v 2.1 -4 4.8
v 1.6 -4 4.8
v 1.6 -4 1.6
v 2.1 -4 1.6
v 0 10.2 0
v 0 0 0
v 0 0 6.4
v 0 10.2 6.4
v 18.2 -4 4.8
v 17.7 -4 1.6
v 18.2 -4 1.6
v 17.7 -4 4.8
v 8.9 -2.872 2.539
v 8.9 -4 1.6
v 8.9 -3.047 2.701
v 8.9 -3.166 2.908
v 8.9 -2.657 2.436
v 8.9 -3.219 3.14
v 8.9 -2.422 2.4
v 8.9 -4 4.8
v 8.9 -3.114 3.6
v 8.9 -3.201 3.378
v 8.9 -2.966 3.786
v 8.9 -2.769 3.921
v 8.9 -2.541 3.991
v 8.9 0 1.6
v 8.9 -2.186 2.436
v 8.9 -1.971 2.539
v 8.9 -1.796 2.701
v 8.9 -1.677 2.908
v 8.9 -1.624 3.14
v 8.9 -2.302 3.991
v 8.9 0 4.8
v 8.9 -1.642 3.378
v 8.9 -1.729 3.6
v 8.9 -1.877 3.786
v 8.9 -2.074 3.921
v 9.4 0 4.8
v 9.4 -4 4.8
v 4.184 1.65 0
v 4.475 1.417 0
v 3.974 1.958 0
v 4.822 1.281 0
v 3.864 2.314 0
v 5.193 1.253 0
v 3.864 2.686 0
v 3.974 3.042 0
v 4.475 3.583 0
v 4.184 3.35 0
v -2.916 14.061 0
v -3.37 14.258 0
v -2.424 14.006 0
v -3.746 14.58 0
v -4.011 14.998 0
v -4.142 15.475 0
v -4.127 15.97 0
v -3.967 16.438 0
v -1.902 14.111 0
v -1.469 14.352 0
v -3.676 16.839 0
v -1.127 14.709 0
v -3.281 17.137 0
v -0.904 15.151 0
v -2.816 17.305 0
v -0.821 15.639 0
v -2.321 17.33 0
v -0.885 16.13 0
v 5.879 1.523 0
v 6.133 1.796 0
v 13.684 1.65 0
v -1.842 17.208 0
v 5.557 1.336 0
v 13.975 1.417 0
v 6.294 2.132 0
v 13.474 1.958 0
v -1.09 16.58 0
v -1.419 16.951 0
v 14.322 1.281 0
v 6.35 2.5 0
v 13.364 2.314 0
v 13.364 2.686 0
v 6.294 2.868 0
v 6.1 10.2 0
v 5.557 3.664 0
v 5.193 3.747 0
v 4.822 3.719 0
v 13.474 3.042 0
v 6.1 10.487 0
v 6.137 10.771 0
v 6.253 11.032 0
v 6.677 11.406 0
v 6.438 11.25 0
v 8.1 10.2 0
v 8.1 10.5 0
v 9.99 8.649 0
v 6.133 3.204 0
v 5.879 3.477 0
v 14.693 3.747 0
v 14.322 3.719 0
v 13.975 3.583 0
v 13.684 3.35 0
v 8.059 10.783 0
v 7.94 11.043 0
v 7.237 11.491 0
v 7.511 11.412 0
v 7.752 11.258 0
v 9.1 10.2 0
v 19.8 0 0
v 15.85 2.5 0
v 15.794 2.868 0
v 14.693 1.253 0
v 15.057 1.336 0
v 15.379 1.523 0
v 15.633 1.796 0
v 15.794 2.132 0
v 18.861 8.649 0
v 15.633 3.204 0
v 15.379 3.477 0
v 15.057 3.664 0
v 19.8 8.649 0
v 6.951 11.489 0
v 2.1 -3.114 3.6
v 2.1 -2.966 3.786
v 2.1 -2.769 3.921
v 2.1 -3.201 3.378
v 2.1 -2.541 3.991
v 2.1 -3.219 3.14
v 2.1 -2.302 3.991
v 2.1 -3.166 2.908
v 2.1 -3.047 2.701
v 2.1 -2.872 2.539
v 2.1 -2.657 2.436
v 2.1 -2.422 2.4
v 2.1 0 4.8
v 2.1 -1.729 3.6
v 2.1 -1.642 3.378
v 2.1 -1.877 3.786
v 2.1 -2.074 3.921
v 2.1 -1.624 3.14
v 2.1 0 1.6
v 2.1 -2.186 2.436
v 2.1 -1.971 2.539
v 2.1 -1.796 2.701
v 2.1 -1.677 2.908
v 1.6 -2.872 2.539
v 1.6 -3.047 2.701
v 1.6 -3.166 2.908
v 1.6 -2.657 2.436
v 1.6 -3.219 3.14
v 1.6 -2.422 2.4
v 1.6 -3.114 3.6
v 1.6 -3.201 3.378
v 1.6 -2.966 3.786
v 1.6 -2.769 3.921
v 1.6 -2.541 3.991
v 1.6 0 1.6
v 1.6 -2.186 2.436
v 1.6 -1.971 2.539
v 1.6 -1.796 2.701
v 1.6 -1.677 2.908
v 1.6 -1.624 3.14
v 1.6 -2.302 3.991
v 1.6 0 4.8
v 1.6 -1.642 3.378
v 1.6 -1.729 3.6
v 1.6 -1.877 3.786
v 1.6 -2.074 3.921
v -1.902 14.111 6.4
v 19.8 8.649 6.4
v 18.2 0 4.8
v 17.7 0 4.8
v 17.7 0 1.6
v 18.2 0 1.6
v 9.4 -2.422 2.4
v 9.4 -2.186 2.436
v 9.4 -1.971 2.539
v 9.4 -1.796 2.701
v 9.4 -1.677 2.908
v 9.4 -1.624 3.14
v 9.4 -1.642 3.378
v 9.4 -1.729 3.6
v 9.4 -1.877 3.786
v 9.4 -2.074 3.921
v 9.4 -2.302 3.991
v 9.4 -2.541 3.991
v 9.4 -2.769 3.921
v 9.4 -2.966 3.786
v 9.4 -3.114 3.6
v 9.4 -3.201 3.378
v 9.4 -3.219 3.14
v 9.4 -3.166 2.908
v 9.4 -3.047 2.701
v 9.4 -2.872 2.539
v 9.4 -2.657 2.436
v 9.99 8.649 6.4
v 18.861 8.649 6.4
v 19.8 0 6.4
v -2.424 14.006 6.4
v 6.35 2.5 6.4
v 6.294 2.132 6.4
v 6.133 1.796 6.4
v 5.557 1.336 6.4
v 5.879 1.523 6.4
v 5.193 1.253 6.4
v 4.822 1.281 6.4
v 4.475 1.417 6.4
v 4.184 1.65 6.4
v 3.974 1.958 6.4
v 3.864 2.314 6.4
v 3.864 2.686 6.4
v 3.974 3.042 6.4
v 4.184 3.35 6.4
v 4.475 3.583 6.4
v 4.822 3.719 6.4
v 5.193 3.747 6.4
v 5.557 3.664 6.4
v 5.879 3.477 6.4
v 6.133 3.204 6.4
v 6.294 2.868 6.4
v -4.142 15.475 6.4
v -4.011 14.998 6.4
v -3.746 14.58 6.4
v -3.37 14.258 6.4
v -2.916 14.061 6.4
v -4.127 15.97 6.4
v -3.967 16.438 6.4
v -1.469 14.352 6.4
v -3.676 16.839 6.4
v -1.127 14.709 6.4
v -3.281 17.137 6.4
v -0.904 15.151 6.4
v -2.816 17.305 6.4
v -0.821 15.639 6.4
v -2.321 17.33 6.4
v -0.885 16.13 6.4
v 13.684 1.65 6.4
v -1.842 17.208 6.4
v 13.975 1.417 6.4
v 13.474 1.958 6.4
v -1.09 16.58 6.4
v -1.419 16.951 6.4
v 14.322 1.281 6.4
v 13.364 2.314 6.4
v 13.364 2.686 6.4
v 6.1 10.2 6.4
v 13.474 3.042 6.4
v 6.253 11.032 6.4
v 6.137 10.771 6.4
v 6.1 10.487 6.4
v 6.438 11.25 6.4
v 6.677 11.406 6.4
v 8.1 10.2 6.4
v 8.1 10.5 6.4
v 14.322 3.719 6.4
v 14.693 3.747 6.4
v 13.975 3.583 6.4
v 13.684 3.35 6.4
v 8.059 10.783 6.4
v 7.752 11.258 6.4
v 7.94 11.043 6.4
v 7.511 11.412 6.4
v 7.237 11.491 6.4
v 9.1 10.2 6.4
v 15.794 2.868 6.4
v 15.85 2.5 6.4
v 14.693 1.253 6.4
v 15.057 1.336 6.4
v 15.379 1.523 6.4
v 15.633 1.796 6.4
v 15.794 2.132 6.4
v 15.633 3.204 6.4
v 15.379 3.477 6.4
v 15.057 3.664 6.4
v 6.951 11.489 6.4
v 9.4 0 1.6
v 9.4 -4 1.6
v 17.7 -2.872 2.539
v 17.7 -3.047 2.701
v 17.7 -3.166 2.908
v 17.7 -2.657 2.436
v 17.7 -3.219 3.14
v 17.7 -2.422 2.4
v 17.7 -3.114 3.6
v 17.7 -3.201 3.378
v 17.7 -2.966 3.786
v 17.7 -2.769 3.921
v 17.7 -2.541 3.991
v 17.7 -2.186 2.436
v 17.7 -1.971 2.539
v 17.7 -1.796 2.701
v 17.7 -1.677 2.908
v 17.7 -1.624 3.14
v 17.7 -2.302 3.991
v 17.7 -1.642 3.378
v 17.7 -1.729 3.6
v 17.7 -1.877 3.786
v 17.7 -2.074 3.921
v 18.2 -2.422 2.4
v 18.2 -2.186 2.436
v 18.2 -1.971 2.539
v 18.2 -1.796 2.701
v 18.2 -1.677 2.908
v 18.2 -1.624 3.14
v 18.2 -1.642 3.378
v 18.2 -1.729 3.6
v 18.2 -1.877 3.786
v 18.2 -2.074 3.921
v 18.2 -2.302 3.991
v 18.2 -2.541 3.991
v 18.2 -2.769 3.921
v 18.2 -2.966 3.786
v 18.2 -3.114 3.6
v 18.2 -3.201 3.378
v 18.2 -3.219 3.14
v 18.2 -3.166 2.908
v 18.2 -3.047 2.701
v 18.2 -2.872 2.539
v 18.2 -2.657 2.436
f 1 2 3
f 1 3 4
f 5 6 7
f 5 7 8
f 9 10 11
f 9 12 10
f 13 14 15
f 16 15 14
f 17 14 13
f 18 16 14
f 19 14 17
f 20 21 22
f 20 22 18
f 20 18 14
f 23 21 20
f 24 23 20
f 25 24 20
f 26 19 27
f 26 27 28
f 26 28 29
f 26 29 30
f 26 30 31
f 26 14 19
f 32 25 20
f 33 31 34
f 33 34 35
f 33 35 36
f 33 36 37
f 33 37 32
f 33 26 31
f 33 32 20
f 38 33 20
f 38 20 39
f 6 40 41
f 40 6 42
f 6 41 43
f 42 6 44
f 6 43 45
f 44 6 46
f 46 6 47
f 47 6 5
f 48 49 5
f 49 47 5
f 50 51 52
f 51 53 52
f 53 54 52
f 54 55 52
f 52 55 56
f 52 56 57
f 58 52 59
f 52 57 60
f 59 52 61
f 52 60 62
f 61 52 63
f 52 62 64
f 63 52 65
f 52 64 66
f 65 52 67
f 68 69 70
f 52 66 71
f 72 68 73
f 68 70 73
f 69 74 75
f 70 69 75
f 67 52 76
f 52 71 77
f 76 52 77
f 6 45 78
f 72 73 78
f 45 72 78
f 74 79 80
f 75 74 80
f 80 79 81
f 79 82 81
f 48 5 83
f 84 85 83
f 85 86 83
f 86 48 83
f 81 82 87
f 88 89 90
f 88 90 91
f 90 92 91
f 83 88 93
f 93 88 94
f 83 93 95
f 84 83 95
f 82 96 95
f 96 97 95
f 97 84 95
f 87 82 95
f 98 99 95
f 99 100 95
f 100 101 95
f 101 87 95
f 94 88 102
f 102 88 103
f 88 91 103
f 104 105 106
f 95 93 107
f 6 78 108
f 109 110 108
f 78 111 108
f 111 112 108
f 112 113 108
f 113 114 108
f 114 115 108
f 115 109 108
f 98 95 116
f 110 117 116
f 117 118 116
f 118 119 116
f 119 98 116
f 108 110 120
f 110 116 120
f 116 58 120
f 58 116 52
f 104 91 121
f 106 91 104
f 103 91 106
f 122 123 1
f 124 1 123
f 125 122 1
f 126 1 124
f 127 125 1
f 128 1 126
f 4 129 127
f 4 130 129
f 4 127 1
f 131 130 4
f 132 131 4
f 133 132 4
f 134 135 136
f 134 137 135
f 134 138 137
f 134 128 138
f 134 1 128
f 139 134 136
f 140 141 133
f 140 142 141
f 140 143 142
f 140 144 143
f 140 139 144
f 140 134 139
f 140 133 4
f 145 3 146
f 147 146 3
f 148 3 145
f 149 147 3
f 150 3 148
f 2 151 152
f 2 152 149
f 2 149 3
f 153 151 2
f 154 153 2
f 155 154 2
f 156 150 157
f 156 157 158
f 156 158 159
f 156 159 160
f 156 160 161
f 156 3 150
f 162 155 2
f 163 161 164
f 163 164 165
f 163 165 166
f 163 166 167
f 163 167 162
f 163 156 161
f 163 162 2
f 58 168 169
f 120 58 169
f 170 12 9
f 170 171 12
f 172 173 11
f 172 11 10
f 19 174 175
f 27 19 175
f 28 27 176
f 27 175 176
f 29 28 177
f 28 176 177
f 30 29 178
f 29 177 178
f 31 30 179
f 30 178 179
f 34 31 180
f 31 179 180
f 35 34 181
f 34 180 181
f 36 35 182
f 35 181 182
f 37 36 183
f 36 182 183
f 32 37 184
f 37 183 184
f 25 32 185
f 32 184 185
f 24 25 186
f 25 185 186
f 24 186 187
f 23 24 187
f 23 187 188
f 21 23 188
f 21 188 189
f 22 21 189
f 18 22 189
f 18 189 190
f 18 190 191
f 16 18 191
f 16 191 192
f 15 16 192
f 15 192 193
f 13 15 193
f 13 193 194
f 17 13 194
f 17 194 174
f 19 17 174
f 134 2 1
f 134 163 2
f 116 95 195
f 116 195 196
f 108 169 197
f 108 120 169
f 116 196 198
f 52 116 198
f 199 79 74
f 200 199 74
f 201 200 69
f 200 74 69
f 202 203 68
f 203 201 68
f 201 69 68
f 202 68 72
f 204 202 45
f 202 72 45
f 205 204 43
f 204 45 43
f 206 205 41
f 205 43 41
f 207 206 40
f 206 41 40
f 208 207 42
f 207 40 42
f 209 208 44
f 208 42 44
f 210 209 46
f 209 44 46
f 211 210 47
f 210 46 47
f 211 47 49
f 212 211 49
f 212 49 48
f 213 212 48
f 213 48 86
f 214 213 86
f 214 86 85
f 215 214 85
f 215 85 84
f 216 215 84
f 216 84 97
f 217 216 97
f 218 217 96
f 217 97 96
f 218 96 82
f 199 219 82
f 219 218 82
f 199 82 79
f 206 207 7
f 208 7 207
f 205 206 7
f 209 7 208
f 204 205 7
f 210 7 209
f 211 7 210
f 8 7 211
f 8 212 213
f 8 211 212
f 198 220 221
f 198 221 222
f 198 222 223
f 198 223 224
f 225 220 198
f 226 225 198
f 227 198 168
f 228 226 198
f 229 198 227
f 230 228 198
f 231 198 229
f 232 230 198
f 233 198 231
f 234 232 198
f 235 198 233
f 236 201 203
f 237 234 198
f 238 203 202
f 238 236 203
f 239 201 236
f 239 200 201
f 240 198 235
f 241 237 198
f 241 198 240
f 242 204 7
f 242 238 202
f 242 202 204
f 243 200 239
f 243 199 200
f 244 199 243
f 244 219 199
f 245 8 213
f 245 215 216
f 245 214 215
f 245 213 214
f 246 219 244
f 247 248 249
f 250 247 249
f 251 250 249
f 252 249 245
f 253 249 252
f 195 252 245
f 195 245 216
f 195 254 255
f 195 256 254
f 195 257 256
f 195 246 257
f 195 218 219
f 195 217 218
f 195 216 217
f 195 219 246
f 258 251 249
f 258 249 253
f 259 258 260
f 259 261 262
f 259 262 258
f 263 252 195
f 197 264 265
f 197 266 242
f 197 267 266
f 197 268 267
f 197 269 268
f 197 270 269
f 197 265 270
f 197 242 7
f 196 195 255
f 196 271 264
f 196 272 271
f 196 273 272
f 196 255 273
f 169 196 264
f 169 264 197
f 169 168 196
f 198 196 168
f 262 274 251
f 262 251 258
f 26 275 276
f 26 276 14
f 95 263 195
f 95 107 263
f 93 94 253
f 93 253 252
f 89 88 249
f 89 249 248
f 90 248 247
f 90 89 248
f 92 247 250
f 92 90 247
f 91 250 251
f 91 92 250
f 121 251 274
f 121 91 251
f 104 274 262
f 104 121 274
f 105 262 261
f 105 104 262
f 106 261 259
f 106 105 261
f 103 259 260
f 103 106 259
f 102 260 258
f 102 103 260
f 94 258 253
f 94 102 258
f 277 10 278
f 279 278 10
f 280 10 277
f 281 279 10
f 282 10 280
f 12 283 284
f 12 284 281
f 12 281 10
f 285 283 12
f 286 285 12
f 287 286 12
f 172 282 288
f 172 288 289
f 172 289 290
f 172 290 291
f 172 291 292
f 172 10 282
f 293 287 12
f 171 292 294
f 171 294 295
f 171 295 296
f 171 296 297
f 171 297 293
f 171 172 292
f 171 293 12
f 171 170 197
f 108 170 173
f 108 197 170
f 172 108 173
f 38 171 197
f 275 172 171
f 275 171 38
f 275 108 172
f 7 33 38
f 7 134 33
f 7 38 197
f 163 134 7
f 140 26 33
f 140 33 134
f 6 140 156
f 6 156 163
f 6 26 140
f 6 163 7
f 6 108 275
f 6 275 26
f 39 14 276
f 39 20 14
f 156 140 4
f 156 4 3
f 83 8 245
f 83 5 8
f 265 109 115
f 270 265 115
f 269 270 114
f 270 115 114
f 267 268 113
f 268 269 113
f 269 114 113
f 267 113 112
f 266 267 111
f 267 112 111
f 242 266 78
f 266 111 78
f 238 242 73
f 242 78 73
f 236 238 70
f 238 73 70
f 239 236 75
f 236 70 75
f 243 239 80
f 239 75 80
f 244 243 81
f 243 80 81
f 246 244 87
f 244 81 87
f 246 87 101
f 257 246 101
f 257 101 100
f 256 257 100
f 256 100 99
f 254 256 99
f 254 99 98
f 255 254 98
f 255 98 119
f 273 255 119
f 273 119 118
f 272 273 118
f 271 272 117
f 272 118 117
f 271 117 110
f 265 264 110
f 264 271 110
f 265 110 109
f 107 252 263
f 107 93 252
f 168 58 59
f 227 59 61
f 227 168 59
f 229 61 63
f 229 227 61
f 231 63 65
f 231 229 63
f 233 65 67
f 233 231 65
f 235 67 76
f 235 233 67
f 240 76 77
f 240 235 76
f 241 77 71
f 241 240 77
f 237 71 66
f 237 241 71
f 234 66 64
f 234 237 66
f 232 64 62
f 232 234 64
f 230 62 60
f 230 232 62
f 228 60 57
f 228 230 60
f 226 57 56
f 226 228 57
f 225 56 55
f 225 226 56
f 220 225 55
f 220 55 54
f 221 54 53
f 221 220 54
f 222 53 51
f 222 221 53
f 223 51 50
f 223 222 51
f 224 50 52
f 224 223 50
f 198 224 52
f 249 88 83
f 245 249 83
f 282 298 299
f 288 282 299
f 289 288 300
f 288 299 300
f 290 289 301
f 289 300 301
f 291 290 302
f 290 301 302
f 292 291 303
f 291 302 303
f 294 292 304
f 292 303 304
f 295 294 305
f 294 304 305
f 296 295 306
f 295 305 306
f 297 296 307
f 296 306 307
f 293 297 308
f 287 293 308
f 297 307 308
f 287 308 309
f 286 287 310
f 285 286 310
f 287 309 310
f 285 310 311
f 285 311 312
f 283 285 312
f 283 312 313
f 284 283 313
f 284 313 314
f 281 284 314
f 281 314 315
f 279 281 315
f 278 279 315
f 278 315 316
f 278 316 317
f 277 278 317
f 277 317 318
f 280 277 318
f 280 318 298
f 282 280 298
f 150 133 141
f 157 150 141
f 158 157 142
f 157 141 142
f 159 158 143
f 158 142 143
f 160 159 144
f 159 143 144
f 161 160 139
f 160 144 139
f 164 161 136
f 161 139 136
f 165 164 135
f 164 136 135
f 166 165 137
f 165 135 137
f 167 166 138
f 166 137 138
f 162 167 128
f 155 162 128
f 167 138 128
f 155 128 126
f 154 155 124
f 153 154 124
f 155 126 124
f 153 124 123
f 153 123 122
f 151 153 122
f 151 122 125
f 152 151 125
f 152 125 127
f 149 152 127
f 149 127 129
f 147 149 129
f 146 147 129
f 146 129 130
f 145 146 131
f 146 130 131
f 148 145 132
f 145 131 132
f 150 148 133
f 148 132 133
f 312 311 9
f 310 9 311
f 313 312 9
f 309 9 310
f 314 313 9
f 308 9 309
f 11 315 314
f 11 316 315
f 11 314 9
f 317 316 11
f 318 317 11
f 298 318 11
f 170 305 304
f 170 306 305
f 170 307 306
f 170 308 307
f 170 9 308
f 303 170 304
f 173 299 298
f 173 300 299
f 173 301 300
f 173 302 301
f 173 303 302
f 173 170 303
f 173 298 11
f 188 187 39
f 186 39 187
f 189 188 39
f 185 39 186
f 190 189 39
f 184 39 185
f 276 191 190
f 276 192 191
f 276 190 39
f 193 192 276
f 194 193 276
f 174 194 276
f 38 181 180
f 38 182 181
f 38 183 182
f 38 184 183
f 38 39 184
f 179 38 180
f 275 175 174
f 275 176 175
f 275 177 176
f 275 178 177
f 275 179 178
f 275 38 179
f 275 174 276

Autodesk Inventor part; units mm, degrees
ref_plane "YZ Plane" through (0, 0, 0) normal (1, 0, 0) x (0, 1, 0)
ref_plane "XZ Plane" through (0, 0, 0) normal (0, 1, 0) x (-1, 0, 0)
ref_plane "XY Plane" through (0, 0, 0) normal (0, 0, 1) x (1, 0, 0)
sketch "Sketch1" plane through (0, 0, 0) normal (0, 0, 1) x (1, 0, 0)
  line L0 (0, 0) -> (0, 10.2)
  line L1 (0, 10.2) -> (9.1, 10.2)
  line L2 (9.1, 10.2) -> (9.99, 8.6487)
  line L3 (9.99, 8.6487) -> (19.8, 8.6487)
  line L4 (19.8, 8.6487) -> (19.8, 0)
  line L5 (19.8, 0) -> (0, 0)
  circle A0 centre (5.1, 2.5) radius 1.25
  circle A1 centre (14.6, 2.5) radius 1.25
  arc A2 (8.1, 10.5) -> (6.1001, 10.4874) centre (7.1, 10.5) ccw
  line L6 (8.1, 10.5) -> (8.1, 10.2)
  line L7 (6.1001, 10.5) -> (6.1001, 10.2)
  dimension "d0" = 9.1
  dimension "d1" = 10.2
  dimension "d2" = 19.8
  dimension "d3" = 2.5
  dimension "d4" = 5.1
  dimension "d5" = 2.5
  dimension "d6" = 9.5
  dimension "d7" = 2.5
  dimension "d8" = 2.5
  dimension "d9" = 2
  dimension "d10" = 7.5
  dimension "d11" = 10.5
extrude "Extrusion1" add sketch "Sketch1" along normal blind 6.4
sketch "Sketch3" plane through (0, 0, 0) normal (0, -1, 0) x (1, 0, 0)
  line L0 (8.9, 1.6) -> (8.9, 4.8)
  line L1 (8.9, 4.8) -> (9.4, 4.8)
  line L2 (9.4, 4.8) -> (9.4, 1.6)
  line L3 (9.4, 1.6) -> (8.9, 1.6)
  line L4 (17.7, 1.6) -> (17.7, 4.8)
  line L5 (17.7, 4.8) -> (18.2, 4.8)
  line L6 (18.2, 4.8) -> (18.2, 1.6)
  line L7 (18.2, 1.6) -> (17.7, 1.6)
  line L8 (1.6, 1.6) -> (1.6, 4.8)
  line L9 (1.6, 4.8) -> (2.1, 4.8)
  line L10 (2.1, 4.8) -> (2.1, 1.6)
  line L11 (2.1, 1.6) -> (1.6, 1.6)
extrude "Extrusion3" add sketch "Sketch3" along normal blind 4
sketch "Sketch4" plane through (18.2, 0, 4.8) normal (1, 0, 0) x (0, 0, -1)
  circle A0 centre (1.6, -2.4215) radius 0.8
  point P0 (4.8, 0)
  dimension "d24" = 1.6
extrude "Extrusion4" cut sketch "Sketch4" against normal blind 22
sketch "Sketch5" plane through (0, 0, 6.4) normal (0, 0, 1) x (1, 0, 0)
  line L0 (19.8, 8.6487) -> (9.99, 8.6487) projected
  line L1 (18.8606, 8.6487) -> (-2.9473, 14.1382)
  line L2 (-2.9473, 14.1382) -> (-2.4872, 14.2588)
  line L3 (-2.4872, 14.2588) -> (19.8, 8.6487)
  circle A0 centre (-2.4872, 15.6717) radius 1.6664
extrude "Extrusion5" add sketch "Sketch5" against normal blind 6.4
sketch "Sketch2" plane through (0, 0, 6.4) normal (0, 0, 1) x (1, 0, 0)
  line L0 (1.6916, 0) -> (2.1916, 0)
  line L1 (2.1916, 0) -> (2.1916, -4)
  line L2 (2.1916, -4) -> (1.6916, -4)
  line L3 (1.6916, -4) -> (1.6916, 0)
  line L4 (10.4916, 0) -> (10.9916, 0)
  line L5 (10.9916, 0) -> (10.9916, -4)
  line L6 (10.9916, -4) -> (10.4916, -4)
  line L7 (10.4916, -4) -> (10.4916, 0)
  line L8 (17.7916, 0) -> (18.2916, 0)
  line L9 (18.2916, 0) -> (18.2916, -4)
  line L10 (18.2916, -4) -> (17.7916, -4)
  line L11 (17.7916, -4) -> (17.7916, 0)
  point P0 (0, 0)
  point P1 (-19.8, 0)
  dimension "d14" = 0.5
  dimension "d15" = 4
  dimension "d16" = 0.5
  dimension "d17" = 0.5
  dimension "d18" = 8.3
  dimension "d19" = 6.8
properties part number "endstopLever"
